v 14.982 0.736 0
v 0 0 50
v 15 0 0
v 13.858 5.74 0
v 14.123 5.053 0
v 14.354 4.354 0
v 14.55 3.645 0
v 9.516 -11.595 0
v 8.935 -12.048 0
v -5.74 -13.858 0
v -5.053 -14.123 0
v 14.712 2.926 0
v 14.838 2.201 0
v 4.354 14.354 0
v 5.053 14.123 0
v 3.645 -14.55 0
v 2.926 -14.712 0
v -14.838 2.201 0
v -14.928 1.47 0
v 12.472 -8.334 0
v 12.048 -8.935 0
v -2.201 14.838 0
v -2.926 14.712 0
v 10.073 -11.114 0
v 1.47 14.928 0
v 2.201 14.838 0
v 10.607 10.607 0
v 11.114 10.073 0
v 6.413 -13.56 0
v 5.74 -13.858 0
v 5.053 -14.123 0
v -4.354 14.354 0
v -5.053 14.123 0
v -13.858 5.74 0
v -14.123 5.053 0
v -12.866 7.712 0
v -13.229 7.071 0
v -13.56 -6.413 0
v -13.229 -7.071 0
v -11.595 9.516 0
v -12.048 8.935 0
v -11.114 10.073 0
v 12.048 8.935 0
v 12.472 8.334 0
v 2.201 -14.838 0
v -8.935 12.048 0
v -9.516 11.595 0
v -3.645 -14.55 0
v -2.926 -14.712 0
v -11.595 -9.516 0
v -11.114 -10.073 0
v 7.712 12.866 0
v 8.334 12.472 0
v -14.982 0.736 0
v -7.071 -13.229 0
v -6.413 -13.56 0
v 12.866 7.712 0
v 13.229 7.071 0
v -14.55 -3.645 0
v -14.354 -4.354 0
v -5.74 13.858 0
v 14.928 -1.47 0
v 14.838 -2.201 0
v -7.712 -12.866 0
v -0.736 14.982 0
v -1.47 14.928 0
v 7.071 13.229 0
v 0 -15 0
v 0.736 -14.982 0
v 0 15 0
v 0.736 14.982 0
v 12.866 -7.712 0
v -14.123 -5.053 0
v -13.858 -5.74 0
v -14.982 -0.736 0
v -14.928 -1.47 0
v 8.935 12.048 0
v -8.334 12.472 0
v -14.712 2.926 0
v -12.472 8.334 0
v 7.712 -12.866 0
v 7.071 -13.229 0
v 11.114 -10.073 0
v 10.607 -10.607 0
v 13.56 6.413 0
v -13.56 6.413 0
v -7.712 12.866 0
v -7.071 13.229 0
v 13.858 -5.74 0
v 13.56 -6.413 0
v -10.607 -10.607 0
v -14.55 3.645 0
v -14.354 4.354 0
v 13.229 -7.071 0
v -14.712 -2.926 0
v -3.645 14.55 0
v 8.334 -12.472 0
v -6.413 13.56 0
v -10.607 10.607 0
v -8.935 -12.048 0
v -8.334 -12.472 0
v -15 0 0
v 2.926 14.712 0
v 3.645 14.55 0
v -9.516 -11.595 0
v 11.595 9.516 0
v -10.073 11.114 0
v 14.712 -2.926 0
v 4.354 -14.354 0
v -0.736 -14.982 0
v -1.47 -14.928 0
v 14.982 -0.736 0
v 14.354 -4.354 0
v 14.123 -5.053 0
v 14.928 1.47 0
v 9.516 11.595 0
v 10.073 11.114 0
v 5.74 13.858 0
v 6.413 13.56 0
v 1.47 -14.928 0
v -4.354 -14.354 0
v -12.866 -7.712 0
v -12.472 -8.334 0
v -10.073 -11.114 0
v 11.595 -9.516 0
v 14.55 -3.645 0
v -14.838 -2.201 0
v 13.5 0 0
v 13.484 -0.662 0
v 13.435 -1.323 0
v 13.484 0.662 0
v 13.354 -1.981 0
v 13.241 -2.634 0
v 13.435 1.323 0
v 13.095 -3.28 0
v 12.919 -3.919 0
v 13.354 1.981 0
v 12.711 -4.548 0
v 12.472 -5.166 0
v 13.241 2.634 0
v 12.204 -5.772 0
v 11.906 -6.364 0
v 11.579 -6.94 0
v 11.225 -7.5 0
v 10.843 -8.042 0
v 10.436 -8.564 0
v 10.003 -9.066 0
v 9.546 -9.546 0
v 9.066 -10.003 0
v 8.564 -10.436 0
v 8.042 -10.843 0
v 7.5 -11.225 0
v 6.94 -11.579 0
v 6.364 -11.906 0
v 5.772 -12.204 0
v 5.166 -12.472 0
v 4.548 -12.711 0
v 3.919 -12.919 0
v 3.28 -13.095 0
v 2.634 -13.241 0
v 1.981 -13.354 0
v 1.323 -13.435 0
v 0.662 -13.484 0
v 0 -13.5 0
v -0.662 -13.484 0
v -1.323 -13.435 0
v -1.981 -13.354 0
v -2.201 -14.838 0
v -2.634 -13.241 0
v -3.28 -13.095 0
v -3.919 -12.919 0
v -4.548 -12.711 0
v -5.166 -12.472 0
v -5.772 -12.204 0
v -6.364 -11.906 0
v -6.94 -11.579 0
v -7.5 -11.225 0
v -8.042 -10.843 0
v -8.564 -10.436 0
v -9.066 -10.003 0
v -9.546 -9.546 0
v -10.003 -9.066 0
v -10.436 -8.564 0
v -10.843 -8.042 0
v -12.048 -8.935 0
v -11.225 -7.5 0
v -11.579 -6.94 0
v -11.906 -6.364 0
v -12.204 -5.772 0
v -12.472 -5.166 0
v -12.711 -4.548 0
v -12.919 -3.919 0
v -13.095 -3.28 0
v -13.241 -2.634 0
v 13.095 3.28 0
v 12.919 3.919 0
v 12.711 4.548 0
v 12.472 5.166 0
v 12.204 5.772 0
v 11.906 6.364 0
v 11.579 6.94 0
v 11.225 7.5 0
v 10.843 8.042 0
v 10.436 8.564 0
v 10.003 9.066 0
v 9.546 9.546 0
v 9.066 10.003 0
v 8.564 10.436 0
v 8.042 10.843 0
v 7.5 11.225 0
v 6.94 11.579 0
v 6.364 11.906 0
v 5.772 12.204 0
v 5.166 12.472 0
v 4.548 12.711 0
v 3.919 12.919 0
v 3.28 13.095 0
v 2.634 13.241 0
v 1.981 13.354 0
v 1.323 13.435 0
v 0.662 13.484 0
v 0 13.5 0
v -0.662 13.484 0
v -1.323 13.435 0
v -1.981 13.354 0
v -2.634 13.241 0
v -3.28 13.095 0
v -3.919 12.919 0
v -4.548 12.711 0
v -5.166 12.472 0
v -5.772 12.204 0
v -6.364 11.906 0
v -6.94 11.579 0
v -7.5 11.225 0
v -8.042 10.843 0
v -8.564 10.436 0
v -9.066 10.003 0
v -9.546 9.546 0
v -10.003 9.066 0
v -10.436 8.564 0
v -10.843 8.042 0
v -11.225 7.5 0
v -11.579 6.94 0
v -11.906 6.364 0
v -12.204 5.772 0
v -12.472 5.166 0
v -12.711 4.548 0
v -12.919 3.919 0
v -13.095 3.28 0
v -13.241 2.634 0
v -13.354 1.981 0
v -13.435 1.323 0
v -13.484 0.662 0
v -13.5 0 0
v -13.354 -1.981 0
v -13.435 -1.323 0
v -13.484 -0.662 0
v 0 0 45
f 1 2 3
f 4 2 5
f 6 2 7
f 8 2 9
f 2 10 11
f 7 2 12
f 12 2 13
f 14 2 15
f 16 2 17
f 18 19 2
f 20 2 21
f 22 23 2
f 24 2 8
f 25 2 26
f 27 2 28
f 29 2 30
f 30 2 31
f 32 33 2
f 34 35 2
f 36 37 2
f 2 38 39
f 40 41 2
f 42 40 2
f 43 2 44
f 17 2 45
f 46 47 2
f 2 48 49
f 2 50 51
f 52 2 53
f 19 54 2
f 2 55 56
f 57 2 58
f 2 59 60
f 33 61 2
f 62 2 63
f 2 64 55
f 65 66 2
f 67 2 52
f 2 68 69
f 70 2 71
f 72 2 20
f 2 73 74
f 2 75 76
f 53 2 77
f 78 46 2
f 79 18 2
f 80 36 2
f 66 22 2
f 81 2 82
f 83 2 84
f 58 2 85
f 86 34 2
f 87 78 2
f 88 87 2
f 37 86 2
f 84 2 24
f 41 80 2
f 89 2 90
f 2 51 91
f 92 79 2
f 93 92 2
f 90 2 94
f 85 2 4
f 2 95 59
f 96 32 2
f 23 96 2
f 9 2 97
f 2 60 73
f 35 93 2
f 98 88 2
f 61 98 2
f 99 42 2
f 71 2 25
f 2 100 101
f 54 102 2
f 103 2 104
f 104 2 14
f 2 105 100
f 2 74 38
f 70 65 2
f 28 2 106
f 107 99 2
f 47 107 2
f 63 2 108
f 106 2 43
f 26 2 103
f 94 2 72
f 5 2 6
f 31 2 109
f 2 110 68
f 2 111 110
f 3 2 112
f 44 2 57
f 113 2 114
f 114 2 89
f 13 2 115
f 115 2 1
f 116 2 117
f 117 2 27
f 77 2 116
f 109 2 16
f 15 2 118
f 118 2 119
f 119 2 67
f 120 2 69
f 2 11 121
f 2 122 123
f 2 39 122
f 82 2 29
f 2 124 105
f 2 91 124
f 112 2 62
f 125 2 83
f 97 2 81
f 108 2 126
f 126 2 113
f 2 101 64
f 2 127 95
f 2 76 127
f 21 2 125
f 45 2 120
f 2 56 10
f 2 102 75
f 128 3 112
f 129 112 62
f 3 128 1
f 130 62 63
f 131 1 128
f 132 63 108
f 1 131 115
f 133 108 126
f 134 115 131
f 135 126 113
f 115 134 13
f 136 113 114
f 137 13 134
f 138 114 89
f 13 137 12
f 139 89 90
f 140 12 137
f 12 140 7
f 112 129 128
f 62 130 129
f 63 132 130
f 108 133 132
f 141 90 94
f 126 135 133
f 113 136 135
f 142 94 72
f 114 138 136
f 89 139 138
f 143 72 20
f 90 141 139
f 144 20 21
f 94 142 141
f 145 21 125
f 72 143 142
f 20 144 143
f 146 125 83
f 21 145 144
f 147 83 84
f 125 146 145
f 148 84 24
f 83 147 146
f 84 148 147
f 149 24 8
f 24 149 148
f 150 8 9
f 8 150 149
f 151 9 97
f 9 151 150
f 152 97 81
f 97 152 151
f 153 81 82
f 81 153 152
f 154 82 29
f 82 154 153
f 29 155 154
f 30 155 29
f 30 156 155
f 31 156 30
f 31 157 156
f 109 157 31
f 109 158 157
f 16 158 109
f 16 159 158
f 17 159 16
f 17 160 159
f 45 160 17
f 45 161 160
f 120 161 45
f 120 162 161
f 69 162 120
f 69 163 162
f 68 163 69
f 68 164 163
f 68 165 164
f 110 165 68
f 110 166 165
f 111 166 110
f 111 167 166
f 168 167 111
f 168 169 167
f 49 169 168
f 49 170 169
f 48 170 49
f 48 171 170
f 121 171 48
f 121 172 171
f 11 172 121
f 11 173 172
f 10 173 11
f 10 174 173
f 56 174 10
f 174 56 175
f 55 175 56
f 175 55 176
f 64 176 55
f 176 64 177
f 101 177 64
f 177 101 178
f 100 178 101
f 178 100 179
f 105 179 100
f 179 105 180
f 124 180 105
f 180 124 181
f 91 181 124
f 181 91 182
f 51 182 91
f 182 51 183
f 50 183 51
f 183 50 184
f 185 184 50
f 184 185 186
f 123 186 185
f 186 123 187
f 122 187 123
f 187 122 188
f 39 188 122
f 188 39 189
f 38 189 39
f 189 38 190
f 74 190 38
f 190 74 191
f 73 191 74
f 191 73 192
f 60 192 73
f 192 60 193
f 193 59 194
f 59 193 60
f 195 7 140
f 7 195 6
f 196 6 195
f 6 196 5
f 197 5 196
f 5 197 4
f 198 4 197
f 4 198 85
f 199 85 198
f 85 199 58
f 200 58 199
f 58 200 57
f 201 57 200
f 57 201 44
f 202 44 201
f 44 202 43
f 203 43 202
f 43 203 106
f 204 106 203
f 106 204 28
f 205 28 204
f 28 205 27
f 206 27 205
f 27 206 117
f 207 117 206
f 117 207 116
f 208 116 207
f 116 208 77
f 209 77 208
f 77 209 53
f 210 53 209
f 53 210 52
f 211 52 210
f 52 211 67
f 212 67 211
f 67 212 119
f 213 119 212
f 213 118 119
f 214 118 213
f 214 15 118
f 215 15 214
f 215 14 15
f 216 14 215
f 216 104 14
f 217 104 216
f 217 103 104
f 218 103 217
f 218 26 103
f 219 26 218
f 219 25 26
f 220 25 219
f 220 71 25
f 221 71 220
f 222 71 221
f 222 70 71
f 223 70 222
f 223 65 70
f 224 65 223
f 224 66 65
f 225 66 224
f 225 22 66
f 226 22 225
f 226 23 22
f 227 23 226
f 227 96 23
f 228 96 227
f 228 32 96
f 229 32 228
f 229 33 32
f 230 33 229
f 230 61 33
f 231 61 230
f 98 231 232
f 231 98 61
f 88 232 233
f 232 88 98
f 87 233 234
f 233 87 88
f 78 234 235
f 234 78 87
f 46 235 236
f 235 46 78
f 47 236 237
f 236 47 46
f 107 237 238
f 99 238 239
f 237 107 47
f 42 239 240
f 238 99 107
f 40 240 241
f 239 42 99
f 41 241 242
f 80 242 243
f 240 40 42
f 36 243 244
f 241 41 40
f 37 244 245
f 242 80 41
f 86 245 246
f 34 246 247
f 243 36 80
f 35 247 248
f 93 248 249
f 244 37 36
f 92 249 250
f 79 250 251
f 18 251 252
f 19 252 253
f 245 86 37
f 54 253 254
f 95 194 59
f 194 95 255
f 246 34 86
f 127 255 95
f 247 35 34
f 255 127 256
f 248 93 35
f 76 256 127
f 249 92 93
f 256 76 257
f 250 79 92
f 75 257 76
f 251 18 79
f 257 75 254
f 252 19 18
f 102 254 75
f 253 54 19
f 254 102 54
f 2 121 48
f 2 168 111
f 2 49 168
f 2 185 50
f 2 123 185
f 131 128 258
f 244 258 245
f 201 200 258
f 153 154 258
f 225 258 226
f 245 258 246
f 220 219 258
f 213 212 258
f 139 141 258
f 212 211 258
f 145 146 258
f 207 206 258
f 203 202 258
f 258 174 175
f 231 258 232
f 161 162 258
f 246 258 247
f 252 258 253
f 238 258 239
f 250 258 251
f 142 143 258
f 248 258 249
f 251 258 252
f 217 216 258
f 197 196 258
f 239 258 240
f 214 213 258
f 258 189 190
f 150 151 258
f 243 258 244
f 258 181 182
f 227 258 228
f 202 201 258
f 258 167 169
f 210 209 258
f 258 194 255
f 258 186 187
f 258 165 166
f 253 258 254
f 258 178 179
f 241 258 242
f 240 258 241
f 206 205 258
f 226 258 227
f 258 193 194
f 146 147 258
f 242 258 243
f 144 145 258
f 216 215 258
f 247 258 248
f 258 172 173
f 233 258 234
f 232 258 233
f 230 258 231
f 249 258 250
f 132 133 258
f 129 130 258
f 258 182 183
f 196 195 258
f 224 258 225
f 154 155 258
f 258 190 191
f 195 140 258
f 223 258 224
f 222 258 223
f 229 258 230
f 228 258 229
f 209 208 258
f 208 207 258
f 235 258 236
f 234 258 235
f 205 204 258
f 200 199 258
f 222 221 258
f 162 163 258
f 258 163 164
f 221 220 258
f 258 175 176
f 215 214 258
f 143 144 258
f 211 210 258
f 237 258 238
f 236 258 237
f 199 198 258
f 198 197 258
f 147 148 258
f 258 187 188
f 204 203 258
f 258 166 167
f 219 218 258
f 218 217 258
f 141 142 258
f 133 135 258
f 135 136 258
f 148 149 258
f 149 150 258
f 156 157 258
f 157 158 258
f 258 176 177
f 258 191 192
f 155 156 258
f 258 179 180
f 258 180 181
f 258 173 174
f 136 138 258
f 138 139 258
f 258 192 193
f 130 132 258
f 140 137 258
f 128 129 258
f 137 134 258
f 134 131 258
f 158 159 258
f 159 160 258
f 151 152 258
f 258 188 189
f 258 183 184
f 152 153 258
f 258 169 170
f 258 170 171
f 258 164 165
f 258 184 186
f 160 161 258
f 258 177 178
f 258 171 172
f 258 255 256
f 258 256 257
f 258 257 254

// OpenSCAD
fn=128;

height=50;
bottom_r=15;

difference() {
    cylinder(h=height,r1=bottom_r,r2=0,$fn=fn);
    cylinder(h=height*.9,r1=bottom_r*.9,r2=0,$fn=fn);
}
